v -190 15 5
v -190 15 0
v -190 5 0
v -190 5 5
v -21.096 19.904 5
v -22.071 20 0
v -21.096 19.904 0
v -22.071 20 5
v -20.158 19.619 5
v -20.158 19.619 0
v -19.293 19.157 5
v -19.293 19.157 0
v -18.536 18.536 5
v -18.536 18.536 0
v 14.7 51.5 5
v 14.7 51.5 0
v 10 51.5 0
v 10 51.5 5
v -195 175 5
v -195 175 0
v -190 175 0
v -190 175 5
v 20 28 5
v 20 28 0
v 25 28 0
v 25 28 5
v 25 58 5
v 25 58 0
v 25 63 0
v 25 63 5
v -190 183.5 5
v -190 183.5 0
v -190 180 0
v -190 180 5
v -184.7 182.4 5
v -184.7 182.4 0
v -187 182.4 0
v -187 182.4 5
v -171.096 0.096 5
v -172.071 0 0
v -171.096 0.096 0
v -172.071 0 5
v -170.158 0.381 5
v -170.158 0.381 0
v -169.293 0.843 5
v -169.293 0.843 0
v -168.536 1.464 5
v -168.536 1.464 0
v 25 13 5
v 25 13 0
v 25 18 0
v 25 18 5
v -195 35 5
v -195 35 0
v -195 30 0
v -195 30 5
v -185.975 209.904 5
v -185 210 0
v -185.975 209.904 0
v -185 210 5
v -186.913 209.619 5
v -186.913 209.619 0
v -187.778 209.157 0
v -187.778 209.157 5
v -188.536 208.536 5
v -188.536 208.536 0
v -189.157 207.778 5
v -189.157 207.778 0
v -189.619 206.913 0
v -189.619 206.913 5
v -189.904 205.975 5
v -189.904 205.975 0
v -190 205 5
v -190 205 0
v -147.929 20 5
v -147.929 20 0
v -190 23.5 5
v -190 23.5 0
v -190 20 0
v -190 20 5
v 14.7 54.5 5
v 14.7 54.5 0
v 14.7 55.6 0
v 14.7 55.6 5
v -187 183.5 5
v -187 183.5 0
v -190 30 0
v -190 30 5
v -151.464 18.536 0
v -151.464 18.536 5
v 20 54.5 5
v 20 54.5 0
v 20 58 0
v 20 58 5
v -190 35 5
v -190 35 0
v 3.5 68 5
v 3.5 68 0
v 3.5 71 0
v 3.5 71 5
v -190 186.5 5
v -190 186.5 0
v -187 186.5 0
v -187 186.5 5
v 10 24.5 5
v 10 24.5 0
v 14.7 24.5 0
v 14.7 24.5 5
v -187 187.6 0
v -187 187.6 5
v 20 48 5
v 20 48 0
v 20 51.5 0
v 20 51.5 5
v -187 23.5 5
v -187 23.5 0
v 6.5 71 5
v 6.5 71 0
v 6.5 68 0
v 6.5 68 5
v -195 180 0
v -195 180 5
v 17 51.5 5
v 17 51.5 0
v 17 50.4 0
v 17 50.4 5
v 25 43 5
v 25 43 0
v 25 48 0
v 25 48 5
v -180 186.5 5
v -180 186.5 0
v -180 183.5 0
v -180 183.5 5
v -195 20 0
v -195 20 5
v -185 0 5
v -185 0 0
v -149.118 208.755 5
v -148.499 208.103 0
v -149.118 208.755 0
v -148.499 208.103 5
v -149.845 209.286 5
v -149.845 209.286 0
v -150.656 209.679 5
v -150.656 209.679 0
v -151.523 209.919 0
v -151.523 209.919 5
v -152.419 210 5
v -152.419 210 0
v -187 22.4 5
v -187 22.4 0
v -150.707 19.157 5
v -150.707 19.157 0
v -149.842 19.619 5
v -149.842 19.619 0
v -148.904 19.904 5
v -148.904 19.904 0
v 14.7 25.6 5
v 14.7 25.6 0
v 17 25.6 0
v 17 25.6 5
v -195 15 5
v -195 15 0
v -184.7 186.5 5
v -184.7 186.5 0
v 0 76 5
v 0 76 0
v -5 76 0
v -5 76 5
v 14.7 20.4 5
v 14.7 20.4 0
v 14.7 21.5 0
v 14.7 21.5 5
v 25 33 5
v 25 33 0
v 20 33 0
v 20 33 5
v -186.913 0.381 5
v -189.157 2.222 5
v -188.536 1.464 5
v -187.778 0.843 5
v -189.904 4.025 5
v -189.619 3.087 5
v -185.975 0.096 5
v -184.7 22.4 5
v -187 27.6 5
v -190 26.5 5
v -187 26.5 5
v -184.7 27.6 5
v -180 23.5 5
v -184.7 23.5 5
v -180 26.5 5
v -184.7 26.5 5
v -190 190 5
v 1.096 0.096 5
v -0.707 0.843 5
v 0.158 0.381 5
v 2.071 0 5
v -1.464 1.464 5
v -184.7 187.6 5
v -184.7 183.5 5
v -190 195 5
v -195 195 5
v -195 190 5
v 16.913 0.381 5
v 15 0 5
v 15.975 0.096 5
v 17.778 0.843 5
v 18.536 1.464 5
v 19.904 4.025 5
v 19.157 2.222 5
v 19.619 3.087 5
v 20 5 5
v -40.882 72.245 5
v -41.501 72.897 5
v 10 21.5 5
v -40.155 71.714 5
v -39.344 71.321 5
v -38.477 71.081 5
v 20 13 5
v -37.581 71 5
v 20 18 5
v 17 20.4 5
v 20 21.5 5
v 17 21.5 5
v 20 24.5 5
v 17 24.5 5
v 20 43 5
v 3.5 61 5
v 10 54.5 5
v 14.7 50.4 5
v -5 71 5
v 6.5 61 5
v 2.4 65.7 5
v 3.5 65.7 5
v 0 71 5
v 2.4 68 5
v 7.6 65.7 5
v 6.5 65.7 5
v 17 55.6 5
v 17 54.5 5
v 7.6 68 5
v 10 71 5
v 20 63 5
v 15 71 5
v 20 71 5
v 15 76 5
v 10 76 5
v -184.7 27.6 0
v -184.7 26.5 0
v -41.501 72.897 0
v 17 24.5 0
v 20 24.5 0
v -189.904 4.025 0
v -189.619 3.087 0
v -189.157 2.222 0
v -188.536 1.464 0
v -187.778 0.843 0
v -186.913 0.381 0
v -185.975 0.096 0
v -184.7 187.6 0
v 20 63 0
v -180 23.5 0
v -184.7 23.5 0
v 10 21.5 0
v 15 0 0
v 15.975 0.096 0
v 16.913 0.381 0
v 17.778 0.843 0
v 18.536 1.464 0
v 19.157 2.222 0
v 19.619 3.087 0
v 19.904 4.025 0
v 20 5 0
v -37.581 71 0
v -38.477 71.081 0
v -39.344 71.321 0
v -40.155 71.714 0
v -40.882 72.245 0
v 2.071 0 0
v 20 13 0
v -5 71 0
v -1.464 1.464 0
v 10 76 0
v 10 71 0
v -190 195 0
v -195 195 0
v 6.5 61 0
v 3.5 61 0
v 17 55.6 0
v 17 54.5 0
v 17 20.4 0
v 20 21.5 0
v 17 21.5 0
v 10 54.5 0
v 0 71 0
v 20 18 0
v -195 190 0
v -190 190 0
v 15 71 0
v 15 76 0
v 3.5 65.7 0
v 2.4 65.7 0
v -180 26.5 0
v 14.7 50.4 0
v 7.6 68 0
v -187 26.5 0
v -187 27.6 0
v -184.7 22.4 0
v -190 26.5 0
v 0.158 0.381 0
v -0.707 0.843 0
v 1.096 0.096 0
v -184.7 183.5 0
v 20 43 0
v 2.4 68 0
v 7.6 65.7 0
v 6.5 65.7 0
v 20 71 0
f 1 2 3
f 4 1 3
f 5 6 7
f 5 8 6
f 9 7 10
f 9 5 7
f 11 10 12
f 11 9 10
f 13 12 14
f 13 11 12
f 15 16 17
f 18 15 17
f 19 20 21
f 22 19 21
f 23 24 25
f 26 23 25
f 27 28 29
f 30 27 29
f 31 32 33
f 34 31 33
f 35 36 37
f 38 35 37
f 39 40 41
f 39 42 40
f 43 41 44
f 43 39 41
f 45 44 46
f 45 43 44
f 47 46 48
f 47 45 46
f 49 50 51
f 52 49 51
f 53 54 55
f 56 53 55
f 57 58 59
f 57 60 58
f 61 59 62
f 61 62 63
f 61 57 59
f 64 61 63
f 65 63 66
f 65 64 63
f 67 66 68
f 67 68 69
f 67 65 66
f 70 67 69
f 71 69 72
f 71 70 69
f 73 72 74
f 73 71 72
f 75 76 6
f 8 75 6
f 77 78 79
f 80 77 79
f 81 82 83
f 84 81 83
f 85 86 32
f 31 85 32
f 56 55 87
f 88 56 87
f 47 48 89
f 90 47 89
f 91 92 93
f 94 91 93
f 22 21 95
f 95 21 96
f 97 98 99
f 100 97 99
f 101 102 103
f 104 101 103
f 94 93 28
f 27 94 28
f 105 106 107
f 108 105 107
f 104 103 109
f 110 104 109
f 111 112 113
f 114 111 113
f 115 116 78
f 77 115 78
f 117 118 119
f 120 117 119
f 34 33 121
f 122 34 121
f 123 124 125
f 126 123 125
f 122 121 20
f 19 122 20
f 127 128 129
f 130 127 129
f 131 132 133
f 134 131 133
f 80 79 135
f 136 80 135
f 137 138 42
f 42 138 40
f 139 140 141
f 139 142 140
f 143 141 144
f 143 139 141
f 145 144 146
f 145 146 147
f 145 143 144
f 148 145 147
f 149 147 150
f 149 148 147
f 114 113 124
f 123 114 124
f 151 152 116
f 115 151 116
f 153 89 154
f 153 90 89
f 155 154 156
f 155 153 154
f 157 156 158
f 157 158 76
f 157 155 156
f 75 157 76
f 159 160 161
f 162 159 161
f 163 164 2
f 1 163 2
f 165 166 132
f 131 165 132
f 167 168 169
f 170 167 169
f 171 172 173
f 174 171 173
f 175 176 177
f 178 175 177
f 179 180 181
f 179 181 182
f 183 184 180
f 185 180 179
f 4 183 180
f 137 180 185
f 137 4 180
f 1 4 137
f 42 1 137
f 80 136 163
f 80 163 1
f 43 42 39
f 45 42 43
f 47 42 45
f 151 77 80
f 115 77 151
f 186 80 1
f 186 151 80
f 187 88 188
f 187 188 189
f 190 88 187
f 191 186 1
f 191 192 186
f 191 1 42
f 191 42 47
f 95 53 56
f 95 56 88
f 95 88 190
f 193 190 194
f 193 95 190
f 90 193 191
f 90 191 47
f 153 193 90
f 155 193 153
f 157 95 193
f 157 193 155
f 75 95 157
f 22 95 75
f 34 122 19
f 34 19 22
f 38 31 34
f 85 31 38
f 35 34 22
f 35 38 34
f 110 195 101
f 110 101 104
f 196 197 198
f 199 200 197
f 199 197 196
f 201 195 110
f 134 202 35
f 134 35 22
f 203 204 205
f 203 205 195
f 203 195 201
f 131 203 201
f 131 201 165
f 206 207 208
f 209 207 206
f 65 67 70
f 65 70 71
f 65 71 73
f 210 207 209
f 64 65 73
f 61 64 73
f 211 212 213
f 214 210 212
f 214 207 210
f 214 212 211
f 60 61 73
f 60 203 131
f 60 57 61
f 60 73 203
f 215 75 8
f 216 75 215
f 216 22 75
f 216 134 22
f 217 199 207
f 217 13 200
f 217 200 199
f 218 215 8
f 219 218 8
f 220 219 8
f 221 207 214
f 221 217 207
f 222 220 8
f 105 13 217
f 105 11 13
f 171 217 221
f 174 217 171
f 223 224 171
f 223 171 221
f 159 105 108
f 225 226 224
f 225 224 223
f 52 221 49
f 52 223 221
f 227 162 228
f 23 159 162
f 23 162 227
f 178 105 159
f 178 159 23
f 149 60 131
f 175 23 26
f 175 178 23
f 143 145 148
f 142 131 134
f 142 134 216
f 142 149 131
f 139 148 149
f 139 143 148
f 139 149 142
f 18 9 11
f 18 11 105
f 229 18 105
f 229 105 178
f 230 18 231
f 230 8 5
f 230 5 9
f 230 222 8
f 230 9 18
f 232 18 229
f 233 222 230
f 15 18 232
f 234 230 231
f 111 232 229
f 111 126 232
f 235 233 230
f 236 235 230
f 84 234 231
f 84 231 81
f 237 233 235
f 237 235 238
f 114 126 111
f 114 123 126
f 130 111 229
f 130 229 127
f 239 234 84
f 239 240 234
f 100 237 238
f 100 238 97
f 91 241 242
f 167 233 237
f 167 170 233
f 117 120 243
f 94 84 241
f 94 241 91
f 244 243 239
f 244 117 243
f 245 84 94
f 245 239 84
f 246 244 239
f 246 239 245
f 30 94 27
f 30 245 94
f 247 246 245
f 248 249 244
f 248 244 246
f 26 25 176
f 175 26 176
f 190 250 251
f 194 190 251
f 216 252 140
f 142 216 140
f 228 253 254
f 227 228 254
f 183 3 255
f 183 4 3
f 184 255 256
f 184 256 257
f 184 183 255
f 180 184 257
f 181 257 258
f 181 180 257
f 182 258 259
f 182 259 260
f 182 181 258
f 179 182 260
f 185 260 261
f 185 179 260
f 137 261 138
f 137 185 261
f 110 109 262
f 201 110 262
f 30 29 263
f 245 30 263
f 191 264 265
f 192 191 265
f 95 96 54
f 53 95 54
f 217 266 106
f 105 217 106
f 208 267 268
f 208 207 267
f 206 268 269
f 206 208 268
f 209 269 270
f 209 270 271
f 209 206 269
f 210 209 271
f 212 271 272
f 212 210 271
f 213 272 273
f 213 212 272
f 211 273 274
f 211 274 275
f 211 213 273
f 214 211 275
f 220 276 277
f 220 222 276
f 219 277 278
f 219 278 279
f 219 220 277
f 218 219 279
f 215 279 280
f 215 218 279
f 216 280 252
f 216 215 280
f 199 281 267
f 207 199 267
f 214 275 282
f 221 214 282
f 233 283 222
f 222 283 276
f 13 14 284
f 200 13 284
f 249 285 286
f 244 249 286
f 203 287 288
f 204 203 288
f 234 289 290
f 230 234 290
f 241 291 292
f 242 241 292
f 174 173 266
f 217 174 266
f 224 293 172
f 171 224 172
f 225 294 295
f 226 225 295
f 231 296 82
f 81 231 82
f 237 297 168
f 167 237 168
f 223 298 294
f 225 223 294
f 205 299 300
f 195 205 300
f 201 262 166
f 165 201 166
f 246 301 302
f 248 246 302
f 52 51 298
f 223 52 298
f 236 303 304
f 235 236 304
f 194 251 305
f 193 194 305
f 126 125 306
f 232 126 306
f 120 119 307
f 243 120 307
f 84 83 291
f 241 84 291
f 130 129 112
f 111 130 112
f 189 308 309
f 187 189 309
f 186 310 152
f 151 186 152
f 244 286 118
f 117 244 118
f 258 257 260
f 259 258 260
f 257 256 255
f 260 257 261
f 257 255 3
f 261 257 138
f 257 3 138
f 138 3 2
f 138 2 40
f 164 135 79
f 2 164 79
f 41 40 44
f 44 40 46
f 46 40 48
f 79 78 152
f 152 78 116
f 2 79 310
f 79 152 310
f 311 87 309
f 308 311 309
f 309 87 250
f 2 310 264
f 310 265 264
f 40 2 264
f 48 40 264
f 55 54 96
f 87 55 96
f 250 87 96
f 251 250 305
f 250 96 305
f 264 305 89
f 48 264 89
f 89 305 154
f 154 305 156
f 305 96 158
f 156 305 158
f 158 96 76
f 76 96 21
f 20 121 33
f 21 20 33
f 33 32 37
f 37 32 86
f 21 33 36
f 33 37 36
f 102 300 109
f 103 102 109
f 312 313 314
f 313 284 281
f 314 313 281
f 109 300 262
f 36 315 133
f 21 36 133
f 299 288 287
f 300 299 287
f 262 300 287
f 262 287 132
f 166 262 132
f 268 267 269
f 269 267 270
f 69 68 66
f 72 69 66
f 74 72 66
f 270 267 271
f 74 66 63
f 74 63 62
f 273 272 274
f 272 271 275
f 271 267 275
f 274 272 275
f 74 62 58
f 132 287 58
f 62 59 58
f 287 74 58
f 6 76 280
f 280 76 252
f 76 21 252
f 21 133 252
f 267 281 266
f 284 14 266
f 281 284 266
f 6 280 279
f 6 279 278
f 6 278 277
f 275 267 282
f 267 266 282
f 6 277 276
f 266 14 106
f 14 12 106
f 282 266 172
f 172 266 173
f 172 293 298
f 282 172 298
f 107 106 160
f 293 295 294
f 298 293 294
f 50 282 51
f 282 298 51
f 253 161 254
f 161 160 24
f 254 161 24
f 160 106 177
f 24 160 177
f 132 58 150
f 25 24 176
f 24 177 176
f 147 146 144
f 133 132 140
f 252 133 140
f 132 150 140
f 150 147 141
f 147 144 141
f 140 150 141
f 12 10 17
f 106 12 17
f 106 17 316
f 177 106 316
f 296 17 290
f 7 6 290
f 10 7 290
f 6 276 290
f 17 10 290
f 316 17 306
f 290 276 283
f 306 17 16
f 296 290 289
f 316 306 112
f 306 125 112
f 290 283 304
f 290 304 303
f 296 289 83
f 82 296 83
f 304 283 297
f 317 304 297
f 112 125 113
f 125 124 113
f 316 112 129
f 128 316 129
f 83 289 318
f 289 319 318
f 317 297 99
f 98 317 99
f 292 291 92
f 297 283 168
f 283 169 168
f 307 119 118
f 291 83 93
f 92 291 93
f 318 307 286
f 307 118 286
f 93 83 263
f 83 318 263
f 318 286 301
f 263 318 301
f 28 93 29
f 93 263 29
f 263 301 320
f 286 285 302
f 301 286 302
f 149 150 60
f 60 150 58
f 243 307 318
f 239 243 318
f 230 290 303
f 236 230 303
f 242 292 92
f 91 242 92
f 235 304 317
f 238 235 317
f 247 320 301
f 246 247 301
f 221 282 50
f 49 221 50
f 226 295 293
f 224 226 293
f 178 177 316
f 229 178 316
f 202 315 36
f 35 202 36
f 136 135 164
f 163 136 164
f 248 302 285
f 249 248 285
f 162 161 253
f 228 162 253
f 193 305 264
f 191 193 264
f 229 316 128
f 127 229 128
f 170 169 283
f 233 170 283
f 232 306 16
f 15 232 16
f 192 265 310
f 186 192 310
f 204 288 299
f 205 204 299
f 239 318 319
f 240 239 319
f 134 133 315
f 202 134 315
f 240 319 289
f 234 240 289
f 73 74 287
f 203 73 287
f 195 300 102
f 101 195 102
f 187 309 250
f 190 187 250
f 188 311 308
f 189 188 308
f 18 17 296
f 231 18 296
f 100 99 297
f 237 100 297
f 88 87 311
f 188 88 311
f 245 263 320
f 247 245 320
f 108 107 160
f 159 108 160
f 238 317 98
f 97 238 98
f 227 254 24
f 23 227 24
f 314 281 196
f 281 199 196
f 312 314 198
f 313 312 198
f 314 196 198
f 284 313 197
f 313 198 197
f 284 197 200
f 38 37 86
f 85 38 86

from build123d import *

# Parameters (mm, degrees)
BOSS_EXTRU_1_DEPTH = 5
CONG_1_R           = 5


with BuildPart() as part:
    # Esquisse1 → Boss.-Extru.1 (new body)
    with BuildSketch(Plane.XY):
        Polygon((0, 0), (20, 0), (20, 13), (25, 13), (25, 18), (20, 18), (20, 21.5), (17, 21.5), (17, 20.4), (14.7, 20.4), (14.7, 21.5), (10, 21.5), (10, 24.5), (14.7, 24.5), (14.7, 25.6), (17, 25.6), (17, 24.5), (20, 24.5), (20, 28), (25, 28), (25, 33), (20, 33), (20, 43), (25, 43), (25, 48), (20, 48), (20, 51.5), (17, 51.5), (17, 50.4), (14.7, 50.4), (14.7, 51.5), (10, 51.5), (10, 54.5), (14.7, 54.5), (14.7, 55.6), (17, 55.6), (17, 54.5), (20, 54.5), (20, 58), (25, 58), (25, 63), (20, 63), (20, 71), (15, 71), (15, 76), (10, 76), (10, 71), (6.5, 71), (6.5, 68), (7.6, 68), (7.6, 65.7), (6.5, 65.7), (6.5, 61), (3.5, 61), (3.5, 65.7), (2.4, 65.7), (2.4, 68), (3.5, 68), (3.5, 71), (0, 71), (0, 76), (-5, 76), (-5, 71), (-40, 71), (-150, 210), (-190, 210), (-190, 195), (-195, 195), (-195, 190), (-190, 190), (-190, 186.5), (-187, 186.5), (-187, 187.6), (-184.7, 187.6), (-184.7, 186.5), (-180, 186.5), (-180, 183.5), (-184.7, 183.5), (-184.7, 182.4), (-187, 182.4), (-187, 183.5), (-190, 183.5), (-190, 180), (-195, 180), (-195, 175), (-190, 175), (-190, 35), (-195, 35), (-195, 30), (-190, 30), (-190, 26.5), (-187, 26.5), (-187, 27.6), (-184.7, 27.6), (-184.7, 26.5), (-180, 26.5), (-180, 23.5), (-184.7, 23.5), (-184.7, 22.4), (-187, 22.4), (-187, 23.5), (-190, 23.5), (-190, 20), (-195, 20), (-195, 15), (-190, 15), (-190, 0), (-170, 0), (-150, 20), (-20, 20), align=None)
    extrude(amount=BOSS_EXTRU_1_DEPTH)

    # Congé1
    cong_1_edges = [part.edges().sort_by_distance(p)[0] for p in [
        (20, 0, 2.5),
        (0, 0, 2.5),
        (-20, 20, 2.5),
        (-150, 20, 2.5),
        (-170, 0, 2.5),
        (-190, 0, 2.5),
        (-190, 210, 2.5),
        (-150, 210, 2.5),
        (-40, 71, 2.5),
    ]]
    fillet(cong_1_edges, radius=CONG_1_R)


solid = part.part
